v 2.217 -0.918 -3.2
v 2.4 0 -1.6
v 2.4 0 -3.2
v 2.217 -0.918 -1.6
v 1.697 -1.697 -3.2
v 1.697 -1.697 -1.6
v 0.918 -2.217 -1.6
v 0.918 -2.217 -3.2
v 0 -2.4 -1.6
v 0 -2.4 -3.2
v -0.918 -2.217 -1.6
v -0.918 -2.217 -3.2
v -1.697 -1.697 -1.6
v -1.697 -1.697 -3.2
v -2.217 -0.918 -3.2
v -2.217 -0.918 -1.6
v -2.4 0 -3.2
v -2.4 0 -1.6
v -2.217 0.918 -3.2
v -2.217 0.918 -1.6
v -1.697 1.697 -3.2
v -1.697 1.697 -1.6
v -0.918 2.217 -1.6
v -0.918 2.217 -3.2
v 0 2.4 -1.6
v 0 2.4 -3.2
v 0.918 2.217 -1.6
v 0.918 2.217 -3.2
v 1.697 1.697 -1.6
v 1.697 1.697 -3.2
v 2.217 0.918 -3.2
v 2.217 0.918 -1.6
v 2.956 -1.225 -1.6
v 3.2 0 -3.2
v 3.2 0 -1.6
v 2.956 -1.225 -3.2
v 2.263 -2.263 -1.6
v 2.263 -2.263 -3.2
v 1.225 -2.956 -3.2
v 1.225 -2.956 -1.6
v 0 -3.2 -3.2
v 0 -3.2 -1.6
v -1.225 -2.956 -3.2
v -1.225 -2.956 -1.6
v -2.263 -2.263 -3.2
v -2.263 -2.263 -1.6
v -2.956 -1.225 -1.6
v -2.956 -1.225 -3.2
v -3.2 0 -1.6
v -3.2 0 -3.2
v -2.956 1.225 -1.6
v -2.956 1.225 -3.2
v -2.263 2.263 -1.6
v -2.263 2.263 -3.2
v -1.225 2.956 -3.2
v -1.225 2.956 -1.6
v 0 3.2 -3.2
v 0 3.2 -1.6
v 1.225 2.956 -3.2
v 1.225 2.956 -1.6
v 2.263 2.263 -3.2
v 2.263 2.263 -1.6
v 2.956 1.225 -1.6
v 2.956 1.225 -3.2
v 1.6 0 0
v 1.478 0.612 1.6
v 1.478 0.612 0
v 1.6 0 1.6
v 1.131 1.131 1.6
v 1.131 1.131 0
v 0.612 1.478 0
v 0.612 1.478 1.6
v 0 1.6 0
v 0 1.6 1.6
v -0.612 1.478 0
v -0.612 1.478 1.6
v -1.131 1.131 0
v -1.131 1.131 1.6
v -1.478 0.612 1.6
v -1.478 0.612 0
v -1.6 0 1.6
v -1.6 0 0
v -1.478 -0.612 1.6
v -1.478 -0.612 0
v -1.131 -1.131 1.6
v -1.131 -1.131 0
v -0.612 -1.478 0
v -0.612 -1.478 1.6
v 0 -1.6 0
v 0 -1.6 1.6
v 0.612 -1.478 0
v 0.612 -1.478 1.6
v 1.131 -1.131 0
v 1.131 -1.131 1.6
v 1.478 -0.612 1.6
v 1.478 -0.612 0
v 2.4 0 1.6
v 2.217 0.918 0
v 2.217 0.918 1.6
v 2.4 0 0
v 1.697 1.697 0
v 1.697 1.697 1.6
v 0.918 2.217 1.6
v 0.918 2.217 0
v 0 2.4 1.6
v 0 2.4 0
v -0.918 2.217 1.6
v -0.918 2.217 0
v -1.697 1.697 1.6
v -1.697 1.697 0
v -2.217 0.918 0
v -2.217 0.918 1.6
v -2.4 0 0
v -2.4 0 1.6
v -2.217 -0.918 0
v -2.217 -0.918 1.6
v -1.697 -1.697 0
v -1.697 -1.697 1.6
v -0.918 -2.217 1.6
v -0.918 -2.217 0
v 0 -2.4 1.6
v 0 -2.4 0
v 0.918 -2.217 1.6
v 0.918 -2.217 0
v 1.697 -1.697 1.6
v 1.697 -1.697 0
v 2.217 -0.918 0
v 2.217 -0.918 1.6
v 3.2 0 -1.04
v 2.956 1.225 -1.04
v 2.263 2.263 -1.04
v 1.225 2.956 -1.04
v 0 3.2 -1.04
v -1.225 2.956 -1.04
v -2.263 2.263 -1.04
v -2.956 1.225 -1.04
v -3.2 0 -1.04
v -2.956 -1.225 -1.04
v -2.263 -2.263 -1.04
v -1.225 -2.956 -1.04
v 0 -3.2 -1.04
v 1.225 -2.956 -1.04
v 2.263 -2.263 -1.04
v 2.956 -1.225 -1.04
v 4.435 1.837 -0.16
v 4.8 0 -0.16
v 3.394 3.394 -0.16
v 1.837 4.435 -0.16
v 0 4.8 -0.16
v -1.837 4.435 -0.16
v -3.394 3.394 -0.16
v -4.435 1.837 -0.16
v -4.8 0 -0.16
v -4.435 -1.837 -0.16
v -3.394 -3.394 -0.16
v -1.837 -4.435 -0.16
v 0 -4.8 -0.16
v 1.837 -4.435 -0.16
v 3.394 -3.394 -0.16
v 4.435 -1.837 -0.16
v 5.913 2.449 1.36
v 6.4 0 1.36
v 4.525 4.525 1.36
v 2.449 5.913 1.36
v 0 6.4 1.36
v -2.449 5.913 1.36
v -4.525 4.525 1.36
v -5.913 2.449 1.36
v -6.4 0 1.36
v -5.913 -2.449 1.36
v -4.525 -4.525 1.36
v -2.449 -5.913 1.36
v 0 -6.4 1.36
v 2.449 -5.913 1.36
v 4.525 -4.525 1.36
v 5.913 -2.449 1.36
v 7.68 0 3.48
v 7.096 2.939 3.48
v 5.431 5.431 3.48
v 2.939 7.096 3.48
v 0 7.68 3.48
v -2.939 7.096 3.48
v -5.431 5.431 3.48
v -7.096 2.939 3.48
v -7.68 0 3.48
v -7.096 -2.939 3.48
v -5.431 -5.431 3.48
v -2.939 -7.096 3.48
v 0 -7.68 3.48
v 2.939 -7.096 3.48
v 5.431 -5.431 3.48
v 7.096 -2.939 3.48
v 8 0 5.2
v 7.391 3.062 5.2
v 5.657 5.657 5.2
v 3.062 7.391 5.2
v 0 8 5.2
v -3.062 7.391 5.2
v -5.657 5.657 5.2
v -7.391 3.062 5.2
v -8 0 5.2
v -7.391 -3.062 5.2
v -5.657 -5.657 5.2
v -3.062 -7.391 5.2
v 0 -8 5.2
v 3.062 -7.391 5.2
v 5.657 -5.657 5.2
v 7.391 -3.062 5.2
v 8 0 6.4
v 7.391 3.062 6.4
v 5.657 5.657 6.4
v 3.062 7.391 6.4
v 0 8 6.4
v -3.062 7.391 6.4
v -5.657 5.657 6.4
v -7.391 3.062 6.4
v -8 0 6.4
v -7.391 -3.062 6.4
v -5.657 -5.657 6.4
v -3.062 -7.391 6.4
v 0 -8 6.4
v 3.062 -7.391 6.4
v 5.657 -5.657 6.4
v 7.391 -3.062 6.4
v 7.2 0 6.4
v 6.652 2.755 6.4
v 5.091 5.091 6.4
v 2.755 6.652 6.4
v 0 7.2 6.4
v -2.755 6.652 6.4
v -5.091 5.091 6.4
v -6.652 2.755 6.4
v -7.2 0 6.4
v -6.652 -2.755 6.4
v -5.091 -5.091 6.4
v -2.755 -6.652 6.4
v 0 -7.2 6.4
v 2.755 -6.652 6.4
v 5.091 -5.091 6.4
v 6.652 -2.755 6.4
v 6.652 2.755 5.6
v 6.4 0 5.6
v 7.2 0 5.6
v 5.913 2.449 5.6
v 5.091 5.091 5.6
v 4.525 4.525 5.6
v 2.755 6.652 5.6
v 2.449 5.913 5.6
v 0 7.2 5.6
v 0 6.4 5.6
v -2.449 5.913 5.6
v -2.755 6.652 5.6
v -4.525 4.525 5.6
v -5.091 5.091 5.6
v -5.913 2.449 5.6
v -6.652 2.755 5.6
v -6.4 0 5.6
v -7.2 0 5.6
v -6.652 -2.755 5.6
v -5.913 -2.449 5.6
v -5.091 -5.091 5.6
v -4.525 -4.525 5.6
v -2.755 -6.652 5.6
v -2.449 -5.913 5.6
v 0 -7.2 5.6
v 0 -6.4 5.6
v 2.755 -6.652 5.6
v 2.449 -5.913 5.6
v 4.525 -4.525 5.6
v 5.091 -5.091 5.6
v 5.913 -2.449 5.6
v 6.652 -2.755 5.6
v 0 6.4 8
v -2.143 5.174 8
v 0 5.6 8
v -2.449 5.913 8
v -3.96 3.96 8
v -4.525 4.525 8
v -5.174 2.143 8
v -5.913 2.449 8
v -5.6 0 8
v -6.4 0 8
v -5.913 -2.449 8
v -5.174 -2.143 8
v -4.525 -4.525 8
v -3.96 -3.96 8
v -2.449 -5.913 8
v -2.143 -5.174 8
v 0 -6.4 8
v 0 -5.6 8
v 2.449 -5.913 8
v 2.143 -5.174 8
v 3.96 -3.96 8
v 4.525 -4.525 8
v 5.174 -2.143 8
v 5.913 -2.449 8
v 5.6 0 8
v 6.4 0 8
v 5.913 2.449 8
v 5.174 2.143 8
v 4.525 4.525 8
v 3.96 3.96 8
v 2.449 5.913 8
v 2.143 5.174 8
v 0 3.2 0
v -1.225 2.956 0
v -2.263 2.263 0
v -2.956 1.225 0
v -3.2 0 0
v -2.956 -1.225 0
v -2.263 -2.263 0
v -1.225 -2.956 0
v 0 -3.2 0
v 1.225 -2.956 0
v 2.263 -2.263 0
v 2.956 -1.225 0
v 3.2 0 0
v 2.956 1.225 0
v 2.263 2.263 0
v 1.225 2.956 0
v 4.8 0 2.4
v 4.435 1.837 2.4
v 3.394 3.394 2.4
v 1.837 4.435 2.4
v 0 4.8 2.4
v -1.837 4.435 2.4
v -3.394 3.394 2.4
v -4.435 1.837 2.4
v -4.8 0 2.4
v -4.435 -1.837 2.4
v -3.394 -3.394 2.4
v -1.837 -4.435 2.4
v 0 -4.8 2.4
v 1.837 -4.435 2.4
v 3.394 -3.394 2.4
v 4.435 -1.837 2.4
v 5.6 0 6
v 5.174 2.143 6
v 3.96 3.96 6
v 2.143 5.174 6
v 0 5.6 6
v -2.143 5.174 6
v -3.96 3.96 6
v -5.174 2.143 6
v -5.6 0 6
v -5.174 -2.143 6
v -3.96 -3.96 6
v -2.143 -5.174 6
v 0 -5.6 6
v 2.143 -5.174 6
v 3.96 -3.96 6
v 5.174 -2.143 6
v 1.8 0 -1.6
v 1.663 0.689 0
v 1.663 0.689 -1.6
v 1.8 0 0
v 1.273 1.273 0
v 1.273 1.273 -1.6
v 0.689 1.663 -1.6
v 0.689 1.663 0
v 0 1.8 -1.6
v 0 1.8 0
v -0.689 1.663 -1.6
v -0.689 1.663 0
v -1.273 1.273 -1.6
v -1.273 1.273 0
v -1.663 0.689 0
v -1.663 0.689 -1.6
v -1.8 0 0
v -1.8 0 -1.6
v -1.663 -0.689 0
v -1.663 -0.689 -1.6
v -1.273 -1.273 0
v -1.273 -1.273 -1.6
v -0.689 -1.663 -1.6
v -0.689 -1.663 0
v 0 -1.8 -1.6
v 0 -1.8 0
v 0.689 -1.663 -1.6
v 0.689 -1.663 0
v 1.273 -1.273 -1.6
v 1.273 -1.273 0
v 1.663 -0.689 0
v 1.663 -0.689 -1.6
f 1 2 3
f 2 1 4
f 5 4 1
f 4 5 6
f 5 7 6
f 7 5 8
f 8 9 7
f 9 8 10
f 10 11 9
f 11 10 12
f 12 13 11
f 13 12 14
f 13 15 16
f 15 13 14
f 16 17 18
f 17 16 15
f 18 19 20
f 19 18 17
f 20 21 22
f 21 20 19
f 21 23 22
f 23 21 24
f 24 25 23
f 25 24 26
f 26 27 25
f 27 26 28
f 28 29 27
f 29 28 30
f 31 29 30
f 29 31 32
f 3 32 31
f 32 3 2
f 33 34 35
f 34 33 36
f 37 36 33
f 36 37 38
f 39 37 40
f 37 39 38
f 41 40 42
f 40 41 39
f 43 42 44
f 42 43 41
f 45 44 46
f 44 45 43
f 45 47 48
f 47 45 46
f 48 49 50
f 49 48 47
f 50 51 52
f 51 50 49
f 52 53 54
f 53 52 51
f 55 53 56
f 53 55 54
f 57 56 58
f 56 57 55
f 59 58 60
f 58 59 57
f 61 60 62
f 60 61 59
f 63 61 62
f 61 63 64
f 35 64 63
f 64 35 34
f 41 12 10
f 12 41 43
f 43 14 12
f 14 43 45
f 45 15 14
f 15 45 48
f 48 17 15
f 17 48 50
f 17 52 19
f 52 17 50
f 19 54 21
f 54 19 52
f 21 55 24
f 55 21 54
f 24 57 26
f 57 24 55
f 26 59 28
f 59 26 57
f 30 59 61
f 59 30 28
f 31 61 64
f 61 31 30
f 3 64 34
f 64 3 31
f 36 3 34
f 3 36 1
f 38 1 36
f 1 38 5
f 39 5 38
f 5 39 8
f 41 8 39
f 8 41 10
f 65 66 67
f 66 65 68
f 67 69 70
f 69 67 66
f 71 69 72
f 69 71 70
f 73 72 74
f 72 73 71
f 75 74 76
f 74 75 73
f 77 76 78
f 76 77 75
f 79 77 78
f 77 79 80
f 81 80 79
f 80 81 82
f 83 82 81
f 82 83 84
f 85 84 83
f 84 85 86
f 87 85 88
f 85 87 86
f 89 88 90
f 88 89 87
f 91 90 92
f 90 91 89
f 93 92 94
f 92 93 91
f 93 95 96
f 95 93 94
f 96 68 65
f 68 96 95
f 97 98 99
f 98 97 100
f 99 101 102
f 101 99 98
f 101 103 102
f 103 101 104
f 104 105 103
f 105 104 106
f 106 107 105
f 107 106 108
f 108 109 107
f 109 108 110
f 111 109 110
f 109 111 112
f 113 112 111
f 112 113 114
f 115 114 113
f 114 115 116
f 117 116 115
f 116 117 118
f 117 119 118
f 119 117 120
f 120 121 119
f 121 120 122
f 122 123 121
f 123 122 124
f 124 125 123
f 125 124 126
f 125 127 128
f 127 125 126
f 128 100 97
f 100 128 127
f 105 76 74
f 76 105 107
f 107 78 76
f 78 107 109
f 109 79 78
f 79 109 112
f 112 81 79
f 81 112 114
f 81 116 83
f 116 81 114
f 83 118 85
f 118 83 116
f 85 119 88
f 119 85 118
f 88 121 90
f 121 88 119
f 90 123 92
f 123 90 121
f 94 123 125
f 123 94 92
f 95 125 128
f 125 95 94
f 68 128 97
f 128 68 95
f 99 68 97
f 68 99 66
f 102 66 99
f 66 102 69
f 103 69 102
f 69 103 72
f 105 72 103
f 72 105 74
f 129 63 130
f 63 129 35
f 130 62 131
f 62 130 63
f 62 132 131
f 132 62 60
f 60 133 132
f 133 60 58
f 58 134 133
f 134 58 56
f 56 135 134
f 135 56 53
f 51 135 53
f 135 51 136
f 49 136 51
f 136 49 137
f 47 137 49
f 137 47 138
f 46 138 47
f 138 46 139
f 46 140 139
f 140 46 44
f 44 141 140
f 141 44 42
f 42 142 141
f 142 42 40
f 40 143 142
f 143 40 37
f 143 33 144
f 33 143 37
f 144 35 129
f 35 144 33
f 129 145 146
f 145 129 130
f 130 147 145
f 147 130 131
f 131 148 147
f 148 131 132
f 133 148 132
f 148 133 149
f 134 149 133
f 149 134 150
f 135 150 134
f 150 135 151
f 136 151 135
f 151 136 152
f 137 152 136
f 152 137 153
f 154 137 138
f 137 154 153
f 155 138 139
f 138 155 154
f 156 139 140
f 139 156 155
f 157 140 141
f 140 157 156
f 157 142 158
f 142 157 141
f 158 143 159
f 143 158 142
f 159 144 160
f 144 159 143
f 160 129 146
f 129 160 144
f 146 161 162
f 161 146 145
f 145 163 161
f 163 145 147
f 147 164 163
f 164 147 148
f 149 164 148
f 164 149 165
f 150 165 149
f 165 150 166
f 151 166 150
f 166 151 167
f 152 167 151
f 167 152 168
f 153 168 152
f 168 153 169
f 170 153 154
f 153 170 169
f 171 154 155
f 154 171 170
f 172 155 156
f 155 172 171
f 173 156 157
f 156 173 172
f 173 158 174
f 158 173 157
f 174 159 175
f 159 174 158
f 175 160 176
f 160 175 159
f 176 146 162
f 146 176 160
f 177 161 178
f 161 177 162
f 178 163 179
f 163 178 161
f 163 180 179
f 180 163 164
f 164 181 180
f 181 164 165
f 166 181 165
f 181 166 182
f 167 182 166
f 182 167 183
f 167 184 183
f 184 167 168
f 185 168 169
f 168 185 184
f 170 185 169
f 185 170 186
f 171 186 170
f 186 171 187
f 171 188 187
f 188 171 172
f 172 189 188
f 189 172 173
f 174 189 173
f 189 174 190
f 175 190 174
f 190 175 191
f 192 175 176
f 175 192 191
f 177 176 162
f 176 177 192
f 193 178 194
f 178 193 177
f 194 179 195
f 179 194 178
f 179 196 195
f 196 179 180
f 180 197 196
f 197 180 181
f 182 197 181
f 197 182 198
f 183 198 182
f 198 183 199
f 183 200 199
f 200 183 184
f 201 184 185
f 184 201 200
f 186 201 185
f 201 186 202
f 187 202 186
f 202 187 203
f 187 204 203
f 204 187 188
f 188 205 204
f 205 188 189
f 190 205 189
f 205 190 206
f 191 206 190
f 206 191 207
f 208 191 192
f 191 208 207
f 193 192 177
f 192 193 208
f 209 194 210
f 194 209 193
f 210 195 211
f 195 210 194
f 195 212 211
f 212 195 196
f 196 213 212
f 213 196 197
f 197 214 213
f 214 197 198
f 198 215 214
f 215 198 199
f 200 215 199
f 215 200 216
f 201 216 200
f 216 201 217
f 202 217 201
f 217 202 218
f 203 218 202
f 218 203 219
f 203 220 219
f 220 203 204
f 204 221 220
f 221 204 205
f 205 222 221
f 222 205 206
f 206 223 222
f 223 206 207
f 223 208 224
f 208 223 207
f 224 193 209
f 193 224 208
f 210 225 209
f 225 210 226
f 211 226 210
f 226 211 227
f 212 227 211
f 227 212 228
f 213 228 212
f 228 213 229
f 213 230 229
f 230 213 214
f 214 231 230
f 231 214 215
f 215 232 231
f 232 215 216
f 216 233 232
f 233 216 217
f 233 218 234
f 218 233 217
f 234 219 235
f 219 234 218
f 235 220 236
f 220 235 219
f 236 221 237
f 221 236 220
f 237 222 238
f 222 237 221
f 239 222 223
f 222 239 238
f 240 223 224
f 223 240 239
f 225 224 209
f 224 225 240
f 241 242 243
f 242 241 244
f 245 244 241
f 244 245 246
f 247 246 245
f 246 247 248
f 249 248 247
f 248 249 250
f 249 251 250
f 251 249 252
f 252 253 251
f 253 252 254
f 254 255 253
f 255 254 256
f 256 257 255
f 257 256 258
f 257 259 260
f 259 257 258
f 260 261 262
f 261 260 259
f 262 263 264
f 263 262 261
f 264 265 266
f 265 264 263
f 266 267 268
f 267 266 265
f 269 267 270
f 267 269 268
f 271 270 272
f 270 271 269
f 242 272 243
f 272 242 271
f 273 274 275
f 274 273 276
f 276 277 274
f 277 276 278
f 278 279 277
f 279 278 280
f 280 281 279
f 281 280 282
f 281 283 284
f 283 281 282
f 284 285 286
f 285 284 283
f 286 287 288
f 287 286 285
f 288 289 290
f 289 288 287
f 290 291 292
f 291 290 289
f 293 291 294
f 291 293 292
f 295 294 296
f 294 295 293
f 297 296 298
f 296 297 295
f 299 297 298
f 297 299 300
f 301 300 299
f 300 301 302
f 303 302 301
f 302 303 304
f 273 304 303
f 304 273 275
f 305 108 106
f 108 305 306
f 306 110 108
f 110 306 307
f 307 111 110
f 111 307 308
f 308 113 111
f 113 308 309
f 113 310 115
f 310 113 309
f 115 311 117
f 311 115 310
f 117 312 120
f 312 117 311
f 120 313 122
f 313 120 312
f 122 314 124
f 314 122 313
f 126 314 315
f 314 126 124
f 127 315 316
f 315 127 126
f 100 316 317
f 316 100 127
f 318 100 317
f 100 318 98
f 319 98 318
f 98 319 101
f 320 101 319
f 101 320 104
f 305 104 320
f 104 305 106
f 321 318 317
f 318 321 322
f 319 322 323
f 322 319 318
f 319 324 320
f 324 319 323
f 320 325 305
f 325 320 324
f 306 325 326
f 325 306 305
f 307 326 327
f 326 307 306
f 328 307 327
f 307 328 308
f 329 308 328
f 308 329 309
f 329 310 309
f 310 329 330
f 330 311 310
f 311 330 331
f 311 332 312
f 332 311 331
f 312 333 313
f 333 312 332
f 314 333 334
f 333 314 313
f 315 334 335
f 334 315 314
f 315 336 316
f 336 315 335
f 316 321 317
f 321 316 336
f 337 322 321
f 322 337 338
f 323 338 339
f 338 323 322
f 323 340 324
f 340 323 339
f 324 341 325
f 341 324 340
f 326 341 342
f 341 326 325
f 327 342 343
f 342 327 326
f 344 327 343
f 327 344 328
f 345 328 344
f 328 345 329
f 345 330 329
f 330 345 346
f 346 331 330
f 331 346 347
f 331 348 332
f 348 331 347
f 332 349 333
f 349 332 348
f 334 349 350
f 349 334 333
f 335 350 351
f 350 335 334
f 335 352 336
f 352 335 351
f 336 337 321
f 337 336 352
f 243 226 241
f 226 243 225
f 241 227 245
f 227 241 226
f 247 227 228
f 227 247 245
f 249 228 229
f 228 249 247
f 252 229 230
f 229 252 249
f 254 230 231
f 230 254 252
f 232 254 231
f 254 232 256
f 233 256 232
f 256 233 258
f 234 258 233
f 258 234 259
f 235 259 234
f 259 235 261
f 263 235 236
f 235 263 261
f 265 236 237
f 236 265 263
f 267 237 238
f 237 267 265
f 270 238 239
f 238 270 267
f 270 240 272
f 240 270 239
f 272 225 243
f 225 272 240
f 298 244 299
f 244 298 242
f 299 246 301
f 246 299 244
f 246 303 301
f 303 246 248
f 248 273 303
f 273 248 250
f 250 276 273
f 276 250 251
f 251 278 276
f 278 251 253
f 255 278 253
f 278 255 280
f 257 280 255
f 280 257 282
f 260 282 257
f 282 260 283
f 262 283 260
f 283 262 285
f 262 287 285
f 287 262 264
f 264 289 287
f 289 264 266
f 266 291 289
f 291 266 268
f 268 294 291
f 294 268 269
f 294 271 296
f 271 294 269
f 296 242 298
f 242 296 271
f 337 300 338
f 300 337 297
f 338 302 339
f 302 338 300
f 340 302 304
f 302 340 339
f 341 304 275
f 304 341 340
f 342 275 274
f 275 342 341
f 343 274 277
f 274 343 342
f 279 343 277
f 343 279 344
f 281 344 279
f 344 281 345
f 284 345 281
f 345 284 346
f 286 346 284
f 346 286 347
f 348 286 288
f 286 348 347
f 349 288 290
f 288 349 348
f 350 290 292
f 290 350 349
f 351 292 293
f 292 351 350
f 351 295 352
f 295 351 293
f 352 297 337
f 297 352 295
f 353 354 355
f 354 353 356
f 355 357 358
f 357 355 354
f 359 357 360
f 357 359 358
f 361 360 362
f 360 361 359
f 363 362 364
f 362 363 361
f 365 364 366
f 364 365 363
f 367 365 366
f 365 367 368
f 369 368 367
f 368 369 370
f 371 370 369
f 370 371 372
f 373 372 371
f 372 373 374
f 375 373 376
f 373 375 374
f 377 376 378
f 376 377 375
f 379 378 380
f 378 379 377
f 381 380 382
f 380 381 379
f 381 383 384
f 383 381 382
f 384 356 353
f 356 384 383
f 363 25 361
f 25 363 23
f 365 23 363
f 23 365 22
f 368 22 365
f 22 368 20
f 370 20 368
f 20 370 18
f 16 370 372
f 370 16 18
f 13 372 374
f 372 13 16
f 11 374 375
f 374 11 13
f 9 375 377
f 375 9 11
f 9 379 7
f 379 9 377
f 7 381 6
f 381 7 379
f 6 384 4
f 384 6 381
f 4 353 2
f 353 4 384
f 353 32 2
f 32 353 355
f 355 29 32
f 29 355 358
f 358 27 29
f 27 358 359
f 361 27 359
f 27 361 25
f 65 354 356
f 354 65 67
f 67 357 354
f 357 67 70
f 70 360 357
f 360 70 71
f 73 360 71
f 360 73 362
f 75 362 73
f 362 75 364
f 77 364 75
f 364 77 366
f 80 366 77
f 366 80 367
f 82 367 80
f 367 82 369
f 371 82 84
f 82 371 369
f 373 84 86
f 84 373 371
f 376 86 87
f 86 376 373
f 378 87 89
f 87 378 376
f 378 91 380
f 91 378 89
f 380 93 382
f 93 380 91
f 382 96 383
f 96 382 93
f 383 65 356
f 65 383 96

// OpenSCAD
use <../lib.scad>
use <../p/4-4con2.scad>
use <../p/4-4con24.scad>
use <../p/4-4con3.scad>
use <../p/4-4con5.scad>
use <../p/4-4con6.scad>
use <../p/4-4cyli.scad>
use <../p/4-4cylo.scad>
use <../p/4-4edge.scad>
use <../p/4-4ring3.scad>
use <../p/4-4ring7.scad>
use <../p/4-4ring8.scad>
use <../p/4-4ring9.scad>
use <../p/stud2a.scad>
use <../p/stud4a.scad>
$fa=1; $fs=0.2;
function ldraw_lib__15395(realsolid=false) = [
// 0 Dome  2 x  2 Inverted with Stud and Tube
// 0 Name: 15395.dat
// 0 Author: Philippe Hurbain [Philo]
// 0 !LDRAW_ORG Part UPDATE 2015-01
// 0 !LICENSE Licensed under CC BY 2.0 and CC BY 4.0 : see CAreadme.txt
// 
// 0 BFC CERTIFY CCW
  [0,"BFC","CERTIFY"],
  [0,"BFC","CCW"],
// 
// 0 !CATEGORY Sphere
// 
// 0 !HISTORY 2014-05-16 {LEGO Digital Designer} Original part shape
// 0 !HISTORY 2015-01-18 [Philo] Complete rewrite for LDraw parts tracker
// 0 !HISTORY 2015-10-11 [PTadmin] Official Update 2015-01
// 
// 
// 1 16 0 4 0 1 0 0 0 -1 0 0 0 -1 stud4a.dat
  [1,16,0,4,0,1,0,0,0,-1,0,0,0,-1, ldraw_lib__stud4a(realsolid)],
// 1 16 0 0 0 1 0 0 0 1 0 0 0 1 stud2a.dat
  [1,16,0,0,0,1,0,0,0,1,0,0,0,1, ldraw_lib__stud2a(realsolid)],
// 1 16 0 0 0 6 0 0 0 1 0 0 0 6 4-4edge.dat
  [1,16,0,0,0,6,0,0,0,1,0,0,0,6, ldraw_lib__4_4edge(realsolid)],
// 1 16 0 0 0 8 0 0 0 1 0 0 0 8 4-4edge.dat
  [1,16,0,0,0,8,0,0,0,1,0,0,0,8, ldraw_lib__4_4edge(realsolid)],
// 1 16 0 2.6 0 8 0 0 0 1 0 0 0 8 4-4edge.dat
  [1,16,0,2.6,0,8,0,0,0,1,0,0,0,8, ldraw_lib__4_4edge(realsolid)],
// 1 16 0 2.6 0 8 0 0 0 1.4 0 0 0 8 4-4cyli.dat
  [1,16,0,2.6,0,8,0,0,0,1.4,0,0,0,8, ldraw_lib__4_4cyli(realsolid)],
// 1 16 0 0.4 0 4 0 0 0 2.2 0 0 0 4 4-4con2.dat
  [1,16,0,0.4,0,4,0,0,0,2.2,0,0,0,4, ldraw_lib__4_4con2(realsolid)],
// 1 16 0 -3.4 0 4 0 0 0 3.8 0 0 0 4 4-4con3.dat
  [1,16,0,-3.4,0,4,0,0,0,3.8,0,0,0,4, ldraw_lib__4_4con3(realsolid)],
// 1 16 0 -8.7 0 3.2 0 0 0 5.3 0 0 0 3.2 4-4con5.dat
  [1,16,0,-8.7,0,3.2,0,0,0,5.3,0,0,0,3.2, ldraw_lib__4_4con5(realsolid)],
// 1 16 0 -13 0 0.8 0 0 0 4.3 0 0 0 0.8 4-4con24.dat
  [1,16,0,-13,0,0.8,0,0,0,4.3,0,0,0,0.8, ldraw_lib__4_4con24(realsolid)],
// 1 16 0 -16 0 20 0 0 0 3 0 0 0 20 4-4cyli.dat
  [1,16,0,-16,0,20,0,0,0,3,0,0,0,20, ldraw_lib__4_4cyli(realsolid)],
// 1 16 0 -16 0 20 0 0 0 1 0 0 0 20 4-4edge.dat
  [1,16,0,-16,0,20,0,0,0,1,0,0,0,20, ldraw_lib__4_4edge(realsolid)],
// 1 16 0 -16 0 2 0 0 0 1 0 0 0 2 4-4ring9.dat
  [1,16,0,-16,0,2,0,0,0,1,0,0,0,2, ldraw_lib__4_4ring9(realsolid)],
// 1 16 0 -14 0 2 0 0 0 1 0 0 0 2 4-4ring8.dat
  [1,16,0,-14,0,2,0,0,0,1,0,0,0,2, ldraw_lib__4_4ring8(realsolid)],
// 1 16 0 -20 0 2 0 0 0 1 0 0 0 2 4-4ring7.dat
  [1,16,0,-20,0,2,0,0,0,1,0,0,0,2, ldraw_lib__4_4ring7(realsolid)],
// 1 16 0 0 0 2 0 0 0 1 0 0 0 2 4-4ring3.dat
  [1,16,0,0,0,2,0,0,0,1,0,0,0,2, ldraw_lib__4_4ring3(realsolid)],
// 0 BFC INVERTNEXT
  [0,"BFC","INVERTNEXT"],
// 1 16 0 -6 0 4 0 0 0 6 0 0 0 4 4-4con2.dat
  [1,16,0,-6,0,4,0,0,0,6,0,0,0,4, ldraw_lib__4_4con2(realsolid)],
// 0 BFC INVERTNEXT
  [0,"BFC","INVERTNEXT"],
// 1 16 0 -15 0 2 0 0 0 9 0 0 0 2 4-4con6.dat
  [1,16,0,-15,0,2,0,0,0,9,0,0,0,2, ldraw_lib__4_4con6(realsolid)],
// 0 BFC INVERTNEXT
  [0,"BFC","INVERTNEXT"],
// 1 16 0 -16 0 18 0 0 0 2 0 0 0 18 4-4cylo.dat
  [1,16,0,-16,0,18,0,0,0,2,0,0,0,18, ldraw_lib__4_4cylo(realsolid)],
// 1 16 0 -20 0 16 0 0 0 6 0 0 0 16 4-4cylo.dat
  [1,16,0,-20,0,16,0,0,0,6,0,0,0,16, ldraw_lib__4_4cylo(realsolid)],
// 0 BFC INVERTNEXT
  [0,"BFC","INVERTNEXT"],
// 1 16 0 -20 0 14 0 0 0 5 0 0 0 14 4-4cyli.dat
  [1,16,0,-20,0,14,0,0,0,5,0,0,0,14, ldraw_lib__4_4cyli(realsolid)],
// 1 16 0 -20 0 14 0 0 0 1 0 0 0 14 4-4edge.dat
  [1,16,0,-20,0,14,0,0,0,1,0,0,0,14, ldraw_lib__4_4edge(realsolid)],
// 1 16 0 4 0 6 0 0 0 1 0 0 0 6 4-4edge.dat
  [1,16,0,4,0,6,0,0,0,1,0,0,0,6, ldraw_lib__4_4edge(realsolid)],
// 1 16 0 4 0 4.5 0 0 0 1 0 0 0 4.5 4-4edge.dat
  [1,16,0,4,0,4.5,0,0,0,1,0,0,0,4.5, ldraw_lib__4_4edge(realsolid)],
// 1 16 0 0 0 4.5 0 0 0 1 0 0 0 4.5 4-4edge.dat
  [1,16,0,0,0,4.5,0,0,0,1,0,0,0,4.5, ldraw_lib__4_4edge(realsolid)],
// 1 16 0 0 0 4 0 0 0 1 0 0 0 4 4-4edge.dat
  [1,16,0,0,0,4,0,0,0,1,0,0,0,4, ldraw_lib__4_4edge(realsolid)],
// 0 BFC INVERTNEXT
  [0,"BFC","INVERTNEXT"],
// 1 16 0 4 0 4.5 0 0 0 -4 0 0 0 4.5 4-4cyli.dat
  [1,16,0,4,0,4.5,0,0,0,-4,0,0,0,4.5, ldraw_lib__4_4cyli(realsolid)],
// 1 16 0 4 0 1.5 0 0 0 -1 0 0 0 1.5 4-4ring3.dat
  [1,16,0,4,0,1.5,0,0,0,-1,0,0,0,1.5, ldraw_lib__4_4ring3(realsolid)],
// 1 16 0 0 0 0.5 0 0 0 -1 0 0 0 0.5 4-4ring8.dat
  [1,16,0,0,0,0.5,0,0,0,-1,0,0,0,0.5, ldraw_lib__4_4ring8(realsolid)],
// 0 // Added lines/Condlines
// 5 24 11.0868 0.4 4.5924 12 0.4 0 7.3912 2.6 3.0616 14.7824 -3.4 6.1232
  [5,24,11.0868,0.4,4.5924,12,0.4,0,7.3912,2.6,3.0616,14.7824,-3.4,6.1232],
// 5 24 8.4852 0.4 8.4852 11.0868 0.4 4.5924 5.6568 2.6 5.6568 11.3136 -3.4 11.3136
  [5,24,8.4852,0.4,8.4852,11.0868,0.4,4.5924,5.6568,2.6,5.6568,11.3136,-3.4,11.3136],
// 5 24 4.5924 0.4 11.0868 8.4852 0.4 8.4852 3.0616 2.6 7.3912 6.1232 -3.4 14.7824
  [5,24,4.5924,0.4,11.0868,8.4852,0.4,8.4852,3.0616,2.6,7.3912,6.1232,-3.4,14.7824],
// 5 24 0 0.4 12 4.5924 0.4 11.0868 0 2.6 8 0 -3.4 16
  [5,24,0,0.4,12,4.5924,0.4,11.0868,0,2.6,8,0,-3.4,16],
// 5 24 -4.5924 0.4 11.0868 0 0.4 12 -3.0616 2.6 7.3912 -6.1232 -3.4 14.7824
  [5,24,-4.5924,0.4,11.0868,0,0.4,12,-3.0616,2.6,7.3912,-6.1232,-3.4,14.7824],
// 5 24 -8.4852 0.4 8.4852 -4.5924 0.4 11.0868 -5.6568 2.6 5.6568 -11.3136 -3.4 11.3136
  [5,24,-8.4852,0.4,8.4852,-4.5924,0.4,11.0868,-5.6568,2.6,5.6568,-11.3136,-3.4,11.3136],
// 5 24 -11.0868 0.4 4.5924 -8.4852 0.4 8.4852 -7.3912 2.6 3.0616 -14.7824 -3.4 6.1232
  [5,24,-11.0868,0.4,4.5924,-8.4852,0.4,8.4852,-7.3912,2.6,3.0616,-14.7824,-3.4,6.1232],
// 5 24 -12 0.4 0 -11.0868 0.4 4.5924 -8 2.6 0 -16 -3.4 0
  [5,24,-12,0.4,0,-11.0868,0.4,4.5924,-8,2.6,0,-16,-3.4,0],
// 5 24 -11.0868 0.4 -4.5924 -12 0.4 0 -7.3912 2.6 -3.0616 -14.7824 -3.4 -6.1232
  [5,24,-11.0868,0.4,-4.5924,-12,0.4,0,-7.3912,2.6,-3.0616,-14.7824,-3.4,-6.1232],
// 5 24 -8.4852 0.4 -8.4852 -11.0868 0.4 -4.5924 -5.6568 2.6 -5.6568 -11.3136 -3.4 -11.3136
  [5,24,-8.4852,0.4,-8.4852,-11.0868,0.4,-4.5924,-5.6568,2.6,-5.6568,-11.3136,-3.4,-11.3136],
// 5 24 -4.5924 0.4 -11.0868 -8.4852 0.4 -8.4852 -3.0616 2.6 -7.3912 -6.1232 -3.4 -14.7824
  [5,24,-4.5924,0.4,-11.0868,-8.4852,0.4,-8.4852,-3.0616,2.6,-7.3912,-6.1232,-3.4,-14.7824],
// 5 24 0 0.4 -12 -4.5924 0.4 -11.0868 0 2.6 -8 0 -3.4 -16
  [5,24,0,0.4,-12,-4.5924,0.4,-11.0868,0,2.6,-8,0,-3.4,-16],
// 5 24 4.5924 0.4 -11.0868 0 0.4 -12 3.0616 2.6 -7.3912 6.1232 -3.4 -14.7824
  [5,24,4.5924,0.4,-11.0868,0,0.4,-12,3.0616,2.6,-7.3912,6.1232,-3.4,-14.7824],
// 5 24 8.4852 0.4 -8.4852 4.5924 0.4 -11.0868 5.6568 2.6 -5.6568 11.3136 -3.4 -11.3136
  [5,24,8.4852,0.4,-8.4852,4.5924,0.4,-11.0868,5.6568,2.6,-5.6568,11.3136,-3.4,-11.3136],
// 5 24 11.0868 0.4 -4.5924 8.4852 0.4 -8.4852 7.3912 2.6 -3.0616 14.7824 -3.4 -6.1232
  [5,24,11.0868,0.4,-4.5924,8.4852,0.4,-8.4852,7.3912,2.6,-3.0616,14.7824,-3.4,-6.1232],
// 5 24 12 0.4 0 11.0868 0.4 -4.5924 8 2.6 0 16 -3.4 0
  [5,24,12,0.4,0,11.0868,0.4,-4.5924,8,2.6,0,16,-3.4,0],
// 5 24 14.7824 -3.4 6.1232 16 -3.4 0 12 0.4 0 17.7389 -8.7 7.3478
  [5,24,14.7824,-3.4,6.1232,16,-3.4,0,12,0.4,0,17.7389,-8.7,7.3478],
// 5 24 11.3136 -3.4 11.3136 14.7824 -3.4 6.1232 11.0868 0.4 4.5924 13.5763 -8.7 13.5763
  [5,24,11.3136,-3.4,11.3136,14.7824,-3.4,6.1232,11.0868,0.4,4.5924,13.5763,-8.7,13.5763],
// 5 24 6.1232 -3.4 14.7824 11.3136 -3.4 11.3136 8.4852 0.4 8.4852 7.3478 -8.7 17.7389
  [5,24,6.1232,-3.4,14.7824,11.3136,-3.4,11.3136,8.4852,0.4,8.4852,7.3478,-8.7,17.7389],
// 5 24 0 -3.4 16 6.1232 -3.4 14.7824 4.5924 0.4 11.0868 0 -8.7 19.2
  [5,24,0,-3.4,16,6.1232,-3.4,14.7824,4.5924,0.4,11.0868,0,-8.7,19.2],
// 5 24 -6.1232 -3.4 14.7824 0 -3.4 16 0 0.4 12 -7.3478 -8.7 17.7389
  [5,24,-6.1232,-3.4,14.7824,0,-3.4,16,0,0.4,12,-7.3478,-8.7,17.7389],
// 5 24 -11.3136 -3.4 11.3136 -6.1232 -3.4 14.7824 -4.5924 0.4 11.0868 -13.5763 -8.7 13.5763
  [5,24,-11.3136,-3.4,11.3136,-6.1232,-3.4,14.7824,-4.5924,0.4,11.0868,-13.5763,-8.7,13.5763],
// 5 24 -14.7824 -3.4 6.1232 -11.3136 -3.4 11.3136 -8.4852 0.4 8.4852 -17.7389 -8.7 7.3478
  [5,24,-14.7824,-3.4,6.1232,-11.3136,-3.4,11.3136,-8.4852,0.4,8.4852,-17.7389,-8.7,7.3478],
// 5 24 -16 -3.4 0 -14.7824 -3.4 6.1232 -11.0868 0.4 4.5924 -19.2 -8.7 0
  [5,24,-16,-3.4,0,-14.7824,-3.4,6.1232,-11.0868,0.4,4.5924,-19.2,-8.7,0],
// 5 24 -14.7824 -3.4 -6.1232 -16 -3.4 0 -12 0.4 0 -17.7389 -8.7 -7.3478
  [5,24,-14.7824,-3.4,-6.1232,-16,-3.4,0,-12,0.4,0,-17.7389,-8.7,-7.3478],
// 5 24 -11.3136 -3.4 -11.3136 -14.7824 -3.4 -6.1232 -11.0868 0.4 -4.5924 -13.5763 -8.7 -13.5763
  [5,24,-11.3136,-3.4,-11.3136,-14.7824,-3.4,-6.1232,-11.0868,0.4,-4.5924,-13.5763,-8.7,-13.5763],
// 5 24 -6.1232 -3.4 -14.7824 -11.3136 -3.4 -11.3136 -8.4852 0.4 -8.4852 -7.3478 -8.7 -17.7389
  [5,24,-6.1232,-3.4,-14.7824,-11.3136,-3.4,-11.3136,-8.4852,0.4,-8.4852,-7.3478,-8.7,-17.7389],
// 5 24 0 -3.4 -16 -6.1232 -3.4 -14.7824 -4.5924 0.4 -11.0868 0 -8.7 -19.2
  [5,24,0,-3.4,-16,-6.1232,-3.4,-14.7824,-4.5924,0.4,-11.0868,0,-8.7,-19.2],
// 5 24 6.1232 -3.4 -14.7824 0 -3.4 -16 0 0.4 -12 7.3478 -8.7 -17.7389
  [5,24,6.1232,-3.4,-14.7824,0,-3.4,-16,0,0.4,-12,7.3478,-8.7,-17.7389],
// 5 24 11.3136 -3.4 -11.3136 6.1232 -3.4 -14.7824 4.5924 0.4 -11.0868 13.5763 -8.7 -13.5763
  [5,24,11.3136,-3.4,-11.3136,6.1232,-3.4,-14.7824,4.5924,0.4,-11.0868,13.5763,-8.7,-13.5763],
// 5 24 14.7824 -3.4 -6.1232 11.3136 -3.4 -11.3136 8.4852 0.4 -8.4852 17.7389 -8.7 -7.3478
  [5,24,14.7824,-3.4,-6.1232,11.3136,-3.4,-11.3136,8.4852,0.4,-8.4852,17.7389,-8.7,-7.3478],
// 5 24 16 -3.4 0 14.7824 -3.4 -6.1232 11.0868 0.4 -4.5924 19.2 -8.7 0
  [5,24,16,-3.4,0,14.7824,-3.4,-6.1232,11.0868,0.4,-4.5924,19.2,-8.7,0],
// 5 24 17.7389 -8.7 7.3478 19.2 -8.7 0 16 -3.4 0 18.478 -13 7.654
  [5,24,17.7389,-8.7,7.3478,19.2,-8.7,0,16,-3.4,0,18.478,-13,7.654],
// 5 24 13.5763 -8.7 13.5763 17.7389 -8.7 7.3478 14.7824 -3.4 6.1232 14.142 -13 14.142
  [5,24,13.5763,-8.7,13.5763,17.7389,-8.7,7.3478,14.7824,-3.4,6.1232,14.142,-13,14.142],
// 5 24 7.3478 -8.7 17.7389 13.5763 -8.7 13.5763 11.3136 -3.4 11.3136 7.654 -13 18.478
  [5,24,7.3478,-8.7,17.7389,13.5763,-8.7,13.5763,11.3136,-3.4,11.3136,7.654,-13,18.478],
// 5 24 0 -8.7 19.2 7.3478 -8.7 17.7389 6.1232 -3.4 14.7824 0 -13 20
  [5,24,0,-8.7,19.2,7.3478,-8.7,17.7389,6.1232,-3.4,14.7824,0,-13,20],
// 5 24 -7.3478 -8.7 17.7389 0 -8.7 19.2 0 -3.4 16 -7.654 -13 18.478
  [5,24,-7.3478,-8.7,17.7389,0,-8.7,19.2,0,-3.4,16,-7.654,-13,18.478],
// 5 24 -13.5763 -8.7 13.5763 -7.3478 -8.7 17.7389 -6.1232 -3.4 14.7824 -14.142 -13 14.142
  [5,24,-13.5763,-8.7,13.5763,-7.3478,-8.7,17.7389,-6.1232,-3.4,14.7824,-14.142,-13,14.142],
// 5 24 -17.7389 -8.7 7.3478 -13.5763 -8.7 13.5763 -11.3136 -3.4 11.3136 -18.478 -13 7.654
  [5,24,-17.7389,-8.7,7.3478,-13.5763,-8.7,13.5763,-11.3136,-3.4,11.3136,-18.478,-13,7.654],
// 5 24 -19.2 -8.7 0 -17.7389 -8.7 7.3478 -14.7824 -3.4 6.1232 -20 -13 0
  [5,24,-19.2,-8.7,0,-17.7389,-8.7,7.3478,-14.7824,-3.4,6.1232,-20,-13,0],
// 5 24 -17.7389 -8.7 -7.3478 -19.2 -8.7 0 -16 -3.4 0 -18.478 -13 -7.654
  [5,24,-17.7389,-8.7,-7.3478,-19.2,-8.7,0,-16,-3.4,0,-18.478,-13,-7.654],
// 5 24 -13.5763 -8.7 -13.5763 -17.7389 -8.7 -7.3478 -14.7824 -3.4 -6.1232 -14.142 -13 -14.142
  [5,24,-13.5763,-8.7,-13.5763,-17.7389,-8.7,-7.3478,-14.7824,-3.4,-6.1232,-14.142,-13,-14.142],
// 5 24 -7.3478 -8.7 -17.7389 -13.5763 -8.7 -13.5763 -11.3136 -3.4 -11.3136 -7.654 -13 -18.478
  [5,24,-7.3478,-8.7,-17.7389,-13.5763,-8.7,-13.5763,-11.3136,-3.4,-11.3136,-7.654,-13,-18.478],
// 5 24 0 -8.7 -19.2 -7.3478 -8.7 -17.7389 -6.1232 -3.4 -14.7824 0 -13 -20
  [5,24,0,-8.7,-19.2,-7.3478,-8.7,-17.7389,-6.1232,-3.4,-14.7824,0,-13,-20],
// 5 24 7.3478 -8.7 -17.7389 0 -8.7 -19.2 0 -3.4 -16 7.654 -13 -18.478
  [5,24,7.3478,-8.7,-17.7389,0,-8.7,-19.2,0,-3.4,-16,7.654,-13,-18.478],
// 5 24 13.5763 -8.7 -13.5763 7.3478 -8.7 -17.7389 6.1232 -3.4 -14.7824 14.142 -13 -14.142
  [5,24,13.5763,-8.7,-13.5763,7.3478,-8.7,-17.7389,6.1232,-3.4,-14.7824,14.142,-13,-14.142],
// 5 24 17.7389 -8.7 -7.3478 13.5763 -8.7 -13.5763 11.3136 -3.4 -11.3136 18.478 -13 -7.654
  [5,24,17.7389,-8.7,-7.3478,13.5763,-8.7,-13.5763,11.3136,-3.4,-11.3136,18.478,-13,-7.654],
// 5 24 19.2 -8.7 0 17.7389 -8.7 -7.3478 14.7824 -3.4 -6.1232 20 -13 0
  [5,24,19.2,-8.7,0,17.7389,-8.7,-7.3478,14.7824,-3.4,-6.1232,20,-13,0],
// 5 24 18.478 -13 7.654 20 -13 0 19.2 -8.7 0 18.478 -16 7.654
  [5,24,18.478,-13,7.654,20,-13,0,19.2,-8.7,0,18.478,-16,7.654],
// 5 24 14.142 -13 14.142 18.478 -13 7.654 17.7389 -8.7 7.3478 14.142 -16 14.142
  [5,24,14.142,-13,14.142,18.478,-13,7.654,17.7389,-8.7,7.3478,14.142,-16,14.142],
// 5 24 7.654 -13 18.478 14.142 -13 14.142 13.5763 -8.7 13.5763 7.654 -16 18.478
  [5,24,7.654,-13,18.478,14.142,-13,14.142,13.5763,-8.7,13.5763,7.654,-16,18.478],
// 5 24 0 -13 20 7.654 -13 18.478 7.3478 -8.7 17.7389 0 -16 20
  [5,24,0,-13,20,7.654,-13,18.478,7.3478,-8.7,17.7389,0,-16,20],
// 5 24 -7.654 -13 18.478 0 -13 20 0 -8.7 19.2 -7.654 -16 18.478
  [5,24,-7.654,-13,18.478,0,-13,20,0,-8.7,19.2,-7.654,-16,18.478],
// 5 24 -14.142 -13 14.142 -7.654 -13 18.478 -7.3478 -8.7 17.7389 -14.142 -16 14.142
  [5,24,-14.142,-13,14.142,-7.654,-13,18.478,-7.3478,-8.7,17.7389,-14.142,-16,14.142],
// 5 24 -18.478 -13 7.654 -14.142 -13 14.142 -13.5763 -8.7 13.5763 -18.478 -16 7.654
  [5,24,-18.478,-13,7.654,-14.142,-13,14.142,-13.5763,-8.7,13.5763,-18.478,-16,7.654],
// 5 24 -20 -13 0 -18.478 -13 7.654 -17.7389 -8.7 7.3478 -20 -16 0
  [5,24,-20,-13,0,-18.478,-13,7.654,-17.7389,-8.7,7.3478,-20,-16,0],
// 5 24 -18.478 -13 -7.654 -20 -13 0 -19.2 -8.7 0 -18.478 -16 -7.654
  [5,24,-18.478,-13,-7.654,-20,-13,0,-19.2,-8.7,0,-18.478,-16,-7.654],
// 5 24 -14.142 -13 -14.142 -18.478 -13 -7.654 -17.7389 -8.7 -7.3478 -14.142 -16 -14.142
  [5,24,-14.142,-13,-14.142,-18.478,-13,-7.654,-17.7389,-8.7,-7.3478,-14.142,-16,-14.142],
// 5 24 -7.654 -13 -18.478 -14.142 -13 -14.142 -13.5763 -8.7 -13.5763 -7.654 -16 -18.478
  [5,24,-7.654,-13,-18.478,-14.142,-13,-14.142,-13.5763,-8.7,-13.5763,-7.654,-16,-18.478],
// 5 24 0 -13 -20 -7.654 -13 -18.478 -7.3478 -8.7 -17.7389 0 -16 -20
  [5,24,0,-13,-20,-7.654,-13,-18.478,-7.3478,-8.7,-17.7389,0,-16,-20],
// 5 24 7.654 -13 -18.478 0 -13 -20 0 -8.7 -19.2 7.654 -16 -18.478
  [5,24,7.654,-13,-18.478,0,-13,-20,0,-8.7,-19.2,7.654,-16,-18.478],
// 5 24 14.142 -13 -14.142 7.654 -13 -18.478 7.3478 -8.7 -17.7389 14.142 -16 -14.142
  [5,24,14.142,-13,-14.142,7.654,-13,-18.478,7.3478,-8.7,-17.7389,14.142,-16,-14.142],
// 5 24 18.478 -13 -7.654 14.142 -13 -14.142 13.5763 -8.7 -13.5763 18.478 -16 -7.654
  [5,24,18.478,-13,-7.654,14.142,-13,-14.142,13.5763,-8.7,-13.5763,18.478,-16,-7.654],
// 5 24 20 -13 0 18.478 -13 -7.654 17.7389 -8.7 -7.3478 20 -16 0
  [5,24,20,-13,0,18.478,-13,-7.654,17.7389,-8.7,-7.3478,20,-16,0],
// 5 24 12 -6 0 11.0868 -6 4.5924 7.3912 0 3.0616 12.9346 -15 5.3578
  [5,24,12,-6,0,11.0868,-6,4.5924,7.3912,0,3.0616,12.9346,-15,5.3578],
// 5 24 11.0868 -6 4.5924 8.4852 -6 8.4852 5.6568 0 5.6568 9.8994 -15 9.8994
  [5,24,11.0868,-6,4.5924,8.4852,-6,8.4852,5.6568,0,5.6568,9.8994,-15,9.8994],
// 5 24 8.4852 -6 8.4852 4.5924 -6 11.0868 3.0616 0 7.3912 5.3578 -15 12.9346
  [5,24,8.4852,-6,8.4852,4.5924,-6,11.0868,3.0616,0,7.3912,5.3578,-15,12.9346],
// 5 24 4.5924 -6 11.0868 0 -6 12 0 0 8 0 -15 14
  [5,24,4.5924,-6,11.0868,0,-6,12,0,0,8,0,-15,14],
// 5 24 0 -6 12 -4.5924 -6 11.0868 -3.0616 0 7.3912 -5.3578 -15 12.9346
  [5,24,0,-6,12,-4.5924,-6,11.0868,-3.0616,0,7.3912,-5.3578,-15,12.9346],
// 5 24 -4.5924 -6 11.0868 -8.4852 -6 8.4852 -5.6568 0 5.6568 -9.8994 -15 9.8994
  [5,24,-4.5924,-6,11.0868,-8.4852,-6,8.4852,-5.6568,0,5.6568,-9.8994,-15,9.8994],
// 5 24 -8.4852 -6 8.4852 -11.0868 -6 4.5924 -7.3912 0 3.0616 -12.9346 -15 5.3578
  [5,24,-8.4852,-6,8.4852,-11.0868,-6,4.5924,-7.3912,0,3.0616,-12.9346,-15,5.3578],
// 5 24 -11.0868 -6 4.5924 -12 -6 0 -8 0 0 -14 -15 0
  [5,24,-11.0868,-6,4.5924,-12,-6,0,-8,0,0,-14,-15,0],
// 5 24 -12 -6 0 -11.0868 -6 -4.5924 -7.3912 0 -3.0616 -12.9346 -15 -5.3578
  [5,24,-12,-6,0,-11.0868,-6,-4.5924,-7.3912,0,-3.0616,-12.9346,-15,-5.3578],
// 5 24 -11.0868 -6 -4.5924 -8.4852 -6 -8.4852 -5.6568 0 -5.6568 -9.8994 -15 -9.8994
  [5,24,-11.0868,-6,-4.5924,-8.4852,-6,-8.4852,-5.6568,0,-5.6568,-9.8994,-15,-9.8994],
// 5 24 -8.4852 -6 -8.4852 -4.5924 -6 -11.0868 -3.0616 0 -7.3912 -5.3578 -15 -12.9346
  [5,24,-8.4852,-6,-8.4852,-4.5924,-6,-11.0868,-3.0616,0,-7.3912,-5.3578,-15,-12.9346],
// 5 24 -4.5924 -6 -11.0868 0 -6 -12 0 0 -8 0 -15 -14
  [5,24,-4.5924,-6,-11.0868,0,-6,-12,0,0,-8,0,-15,-14],
// 5 24 0 -6 -12 4.5924 -6 -11.0868 3.0616 0 -7.3912 5.3578 -15 -12.9346
  [5,24,0,-6,-12,4.5924,-6,-11.0868,3.0616,0,-7.3912,5.3578,-15,-12.9346],
// 5 24 4.5924 -6 -11.0868 8.4852 -6 -8.4852 5.6568 0 -5.6568 9.8994 -15 -9.8994
  [5,24,4.5924,-6,-11.0868,8.4852,-6,-8.4852,5.6568,0,-5.6568,9.8994,-15,-9.8994],
// 5 24 8.4852 -6 -8.4852 11.0868 -6 -4.5924 7.3912 0 -3.0616 12.9346 -15 -5.3578
  [5,24,8.4852,-6,-8.4852,11.0868,-6,-4.5924,7.3912,0,-3.0616,12.9346,-15,-5.3578],
// 5 24 11.0868 -6 -4.5924 12 -6 0 8 0 0 14 -15 0
  [5,24,11.0868,-6,-4.5924,12,-6,0,8,0,0,14,-15,0],
// 5 24 14 -15 0 12.9346 -15 5.3578 11.0868 -6 4.5924 12.9346 -20 5.3578
  [5,24,14,-15,0,12.9346,-15,5.3578,11.0868,-6,4.5924,12.9346,-20,5.3578],
// 5 24 12.9346 -15 5.3578 9.8994 -15 9.8994 8.4852 -6 8.4852 9.8994 -20 9.8994
  [5,24,12.9346,-15,5.3578,9.8994,-15,9.8994,8.4852,-6,8.4852,9.8994,-20,9.8994],
// 5 24 9.8994 -15 9.8994 5.3578 -15 12.9346 4.5924 -6 11.0868 5.3578 -20 12.9346
  [5,24,9.8994,-15,9.8994,5.3578,-15,12.9346,4.5924,-6,11.0868,5.3578,-20,12.9346],
// 5 24 5.3578 -15 12.9346 0 -15 14 0 -6 12 0 -20 14
  [5,24,5.3578,-15,12.9346,0,-15,14,0,-6,12,0,-20,14],
// 5 24 0 -15 14 -5.3578 -15 12.9346 -4.5924 -6 11.0868 -5.3578 -20 12.9346
  [5,24,0,-15,14,-5.3578,-15,12.9346,-4.5924,-6,11.0868,-5.3578,-20,12.9346],
// 5 24 -5.3578 -15 12.9346 -9.8994 -15 9.8994 -8.4852 -6 8.4852 -9.8994 -20 9.8994
  [5,24,-5.3578,-15,12.9346,-9.8994,-15,9.8994,-8.4852,-6,8.4852,-9.8994,-20,9.8994],
// 5 24 -9.8994 -15 9.8994 -12.9346 -15 5.3578 -11.0868 -6 4.5924 -12.9346 -20 5.3578
  [5,24,-9.8994,-15,9.8994,-12.9346,-15,5.3578,-11.0868,-6,4.5924,-12.9346,-20,5.3578],
// 5 24 -12.9346 -15 5.3578 -14 -15 0 -12 -6 0 -14 -20 0
  [5,24,-12.9346,-15,5.3578,-14,-15,0,-12,-6,0,-14,-20,0],
// 5 24 -14 -15 0 -12.9346 -15 -5.3578 -11.0868 -6 -4.5924 -12.9346 -20 -5.3578
  [5,24,-14,-15,0,-12.9346,-15,-5.3578,-11.0868,-6,-4.5924,-12.9346,-20,-5.3578],
// 5 24 -12.9346 -15 -5.3578 -9.8994 -15 -9.8994 -8.4852 -6 -8.4852 -9.8994 -20 -9.8994
  [5,24,-12.9346,-15,-5.3578,-9.8994,-15,-9.8994,-8.4852,-6,-8.4852,-9.8994,-20,-9.8994],
// 5 24 -9.8994 -15 -9.8994 -5.3578 -15 -12.9346 -4.5924 -6 -11.0868 -5.3578 -20 -12.9346
  [5,24,-9.8994,-15,-9.8994,-5.3578,-15,-12.9346,-4.5924,-6,-11.0868,-5.3578,-20,-12.9346],
// 5 24 -5.3578 -15 -12.9346 0 -15 -14 0 -6 -12 0 -20 -14
  [5,24,-5.3578,-15,-12.9346,0,-15,-14,0,-6,-12,0,-20,-14],
// 5 24 0 -15 -14 5.3578 -15 -12.9346 4.5924 -6 -11.0868 5.3578 -20 -12.9346
  [5,24,0,-15,-14,5.3578,-15,-12.9346,4.5924,-6,-11.0868,5.3578,-20,-12.9346],
// 5 24 5.3578 -15 -12.9346 9.8994 -15 -9.8994 8.4852 -6 -8.4852 9.8994 -20 -9.8994
  [5,24,5.3578,-15,-12.9346,9.8994,-15,-9.8994,8.4852,-6,-8.4852,9.8994,-20,-9.8994],
// 5 24 9.8994 -15 -9.8994 12.9346 -15 -5.3578 11.0868 -6 -4.5924 12.9346 -20 -5.3578
  [5,24,9.8994,-15,-9.8994,12.9346,-15,-5.3578,11.0868,-6,-4.5924,12.9346,-20,-5.3578],
// 5 24 12.9346 -15 -5.3578 14 -15 0 12 -6 0 14 -20 0
  [5,24,12.9346,-15,-5.3578,14,-15,0,12,-6,0,14,-20,0],
];
module ldraw_lib__15395(step=0, col=false, unit=2/5, alt=false, line=0.2, solid=!$preview)
    makepoly(ldraw_lib__15395(solid), step=step, col=col, unit=unit, alt=alt, line=line, solid=solid);
ldraw_lib__15395(line=0.2);
